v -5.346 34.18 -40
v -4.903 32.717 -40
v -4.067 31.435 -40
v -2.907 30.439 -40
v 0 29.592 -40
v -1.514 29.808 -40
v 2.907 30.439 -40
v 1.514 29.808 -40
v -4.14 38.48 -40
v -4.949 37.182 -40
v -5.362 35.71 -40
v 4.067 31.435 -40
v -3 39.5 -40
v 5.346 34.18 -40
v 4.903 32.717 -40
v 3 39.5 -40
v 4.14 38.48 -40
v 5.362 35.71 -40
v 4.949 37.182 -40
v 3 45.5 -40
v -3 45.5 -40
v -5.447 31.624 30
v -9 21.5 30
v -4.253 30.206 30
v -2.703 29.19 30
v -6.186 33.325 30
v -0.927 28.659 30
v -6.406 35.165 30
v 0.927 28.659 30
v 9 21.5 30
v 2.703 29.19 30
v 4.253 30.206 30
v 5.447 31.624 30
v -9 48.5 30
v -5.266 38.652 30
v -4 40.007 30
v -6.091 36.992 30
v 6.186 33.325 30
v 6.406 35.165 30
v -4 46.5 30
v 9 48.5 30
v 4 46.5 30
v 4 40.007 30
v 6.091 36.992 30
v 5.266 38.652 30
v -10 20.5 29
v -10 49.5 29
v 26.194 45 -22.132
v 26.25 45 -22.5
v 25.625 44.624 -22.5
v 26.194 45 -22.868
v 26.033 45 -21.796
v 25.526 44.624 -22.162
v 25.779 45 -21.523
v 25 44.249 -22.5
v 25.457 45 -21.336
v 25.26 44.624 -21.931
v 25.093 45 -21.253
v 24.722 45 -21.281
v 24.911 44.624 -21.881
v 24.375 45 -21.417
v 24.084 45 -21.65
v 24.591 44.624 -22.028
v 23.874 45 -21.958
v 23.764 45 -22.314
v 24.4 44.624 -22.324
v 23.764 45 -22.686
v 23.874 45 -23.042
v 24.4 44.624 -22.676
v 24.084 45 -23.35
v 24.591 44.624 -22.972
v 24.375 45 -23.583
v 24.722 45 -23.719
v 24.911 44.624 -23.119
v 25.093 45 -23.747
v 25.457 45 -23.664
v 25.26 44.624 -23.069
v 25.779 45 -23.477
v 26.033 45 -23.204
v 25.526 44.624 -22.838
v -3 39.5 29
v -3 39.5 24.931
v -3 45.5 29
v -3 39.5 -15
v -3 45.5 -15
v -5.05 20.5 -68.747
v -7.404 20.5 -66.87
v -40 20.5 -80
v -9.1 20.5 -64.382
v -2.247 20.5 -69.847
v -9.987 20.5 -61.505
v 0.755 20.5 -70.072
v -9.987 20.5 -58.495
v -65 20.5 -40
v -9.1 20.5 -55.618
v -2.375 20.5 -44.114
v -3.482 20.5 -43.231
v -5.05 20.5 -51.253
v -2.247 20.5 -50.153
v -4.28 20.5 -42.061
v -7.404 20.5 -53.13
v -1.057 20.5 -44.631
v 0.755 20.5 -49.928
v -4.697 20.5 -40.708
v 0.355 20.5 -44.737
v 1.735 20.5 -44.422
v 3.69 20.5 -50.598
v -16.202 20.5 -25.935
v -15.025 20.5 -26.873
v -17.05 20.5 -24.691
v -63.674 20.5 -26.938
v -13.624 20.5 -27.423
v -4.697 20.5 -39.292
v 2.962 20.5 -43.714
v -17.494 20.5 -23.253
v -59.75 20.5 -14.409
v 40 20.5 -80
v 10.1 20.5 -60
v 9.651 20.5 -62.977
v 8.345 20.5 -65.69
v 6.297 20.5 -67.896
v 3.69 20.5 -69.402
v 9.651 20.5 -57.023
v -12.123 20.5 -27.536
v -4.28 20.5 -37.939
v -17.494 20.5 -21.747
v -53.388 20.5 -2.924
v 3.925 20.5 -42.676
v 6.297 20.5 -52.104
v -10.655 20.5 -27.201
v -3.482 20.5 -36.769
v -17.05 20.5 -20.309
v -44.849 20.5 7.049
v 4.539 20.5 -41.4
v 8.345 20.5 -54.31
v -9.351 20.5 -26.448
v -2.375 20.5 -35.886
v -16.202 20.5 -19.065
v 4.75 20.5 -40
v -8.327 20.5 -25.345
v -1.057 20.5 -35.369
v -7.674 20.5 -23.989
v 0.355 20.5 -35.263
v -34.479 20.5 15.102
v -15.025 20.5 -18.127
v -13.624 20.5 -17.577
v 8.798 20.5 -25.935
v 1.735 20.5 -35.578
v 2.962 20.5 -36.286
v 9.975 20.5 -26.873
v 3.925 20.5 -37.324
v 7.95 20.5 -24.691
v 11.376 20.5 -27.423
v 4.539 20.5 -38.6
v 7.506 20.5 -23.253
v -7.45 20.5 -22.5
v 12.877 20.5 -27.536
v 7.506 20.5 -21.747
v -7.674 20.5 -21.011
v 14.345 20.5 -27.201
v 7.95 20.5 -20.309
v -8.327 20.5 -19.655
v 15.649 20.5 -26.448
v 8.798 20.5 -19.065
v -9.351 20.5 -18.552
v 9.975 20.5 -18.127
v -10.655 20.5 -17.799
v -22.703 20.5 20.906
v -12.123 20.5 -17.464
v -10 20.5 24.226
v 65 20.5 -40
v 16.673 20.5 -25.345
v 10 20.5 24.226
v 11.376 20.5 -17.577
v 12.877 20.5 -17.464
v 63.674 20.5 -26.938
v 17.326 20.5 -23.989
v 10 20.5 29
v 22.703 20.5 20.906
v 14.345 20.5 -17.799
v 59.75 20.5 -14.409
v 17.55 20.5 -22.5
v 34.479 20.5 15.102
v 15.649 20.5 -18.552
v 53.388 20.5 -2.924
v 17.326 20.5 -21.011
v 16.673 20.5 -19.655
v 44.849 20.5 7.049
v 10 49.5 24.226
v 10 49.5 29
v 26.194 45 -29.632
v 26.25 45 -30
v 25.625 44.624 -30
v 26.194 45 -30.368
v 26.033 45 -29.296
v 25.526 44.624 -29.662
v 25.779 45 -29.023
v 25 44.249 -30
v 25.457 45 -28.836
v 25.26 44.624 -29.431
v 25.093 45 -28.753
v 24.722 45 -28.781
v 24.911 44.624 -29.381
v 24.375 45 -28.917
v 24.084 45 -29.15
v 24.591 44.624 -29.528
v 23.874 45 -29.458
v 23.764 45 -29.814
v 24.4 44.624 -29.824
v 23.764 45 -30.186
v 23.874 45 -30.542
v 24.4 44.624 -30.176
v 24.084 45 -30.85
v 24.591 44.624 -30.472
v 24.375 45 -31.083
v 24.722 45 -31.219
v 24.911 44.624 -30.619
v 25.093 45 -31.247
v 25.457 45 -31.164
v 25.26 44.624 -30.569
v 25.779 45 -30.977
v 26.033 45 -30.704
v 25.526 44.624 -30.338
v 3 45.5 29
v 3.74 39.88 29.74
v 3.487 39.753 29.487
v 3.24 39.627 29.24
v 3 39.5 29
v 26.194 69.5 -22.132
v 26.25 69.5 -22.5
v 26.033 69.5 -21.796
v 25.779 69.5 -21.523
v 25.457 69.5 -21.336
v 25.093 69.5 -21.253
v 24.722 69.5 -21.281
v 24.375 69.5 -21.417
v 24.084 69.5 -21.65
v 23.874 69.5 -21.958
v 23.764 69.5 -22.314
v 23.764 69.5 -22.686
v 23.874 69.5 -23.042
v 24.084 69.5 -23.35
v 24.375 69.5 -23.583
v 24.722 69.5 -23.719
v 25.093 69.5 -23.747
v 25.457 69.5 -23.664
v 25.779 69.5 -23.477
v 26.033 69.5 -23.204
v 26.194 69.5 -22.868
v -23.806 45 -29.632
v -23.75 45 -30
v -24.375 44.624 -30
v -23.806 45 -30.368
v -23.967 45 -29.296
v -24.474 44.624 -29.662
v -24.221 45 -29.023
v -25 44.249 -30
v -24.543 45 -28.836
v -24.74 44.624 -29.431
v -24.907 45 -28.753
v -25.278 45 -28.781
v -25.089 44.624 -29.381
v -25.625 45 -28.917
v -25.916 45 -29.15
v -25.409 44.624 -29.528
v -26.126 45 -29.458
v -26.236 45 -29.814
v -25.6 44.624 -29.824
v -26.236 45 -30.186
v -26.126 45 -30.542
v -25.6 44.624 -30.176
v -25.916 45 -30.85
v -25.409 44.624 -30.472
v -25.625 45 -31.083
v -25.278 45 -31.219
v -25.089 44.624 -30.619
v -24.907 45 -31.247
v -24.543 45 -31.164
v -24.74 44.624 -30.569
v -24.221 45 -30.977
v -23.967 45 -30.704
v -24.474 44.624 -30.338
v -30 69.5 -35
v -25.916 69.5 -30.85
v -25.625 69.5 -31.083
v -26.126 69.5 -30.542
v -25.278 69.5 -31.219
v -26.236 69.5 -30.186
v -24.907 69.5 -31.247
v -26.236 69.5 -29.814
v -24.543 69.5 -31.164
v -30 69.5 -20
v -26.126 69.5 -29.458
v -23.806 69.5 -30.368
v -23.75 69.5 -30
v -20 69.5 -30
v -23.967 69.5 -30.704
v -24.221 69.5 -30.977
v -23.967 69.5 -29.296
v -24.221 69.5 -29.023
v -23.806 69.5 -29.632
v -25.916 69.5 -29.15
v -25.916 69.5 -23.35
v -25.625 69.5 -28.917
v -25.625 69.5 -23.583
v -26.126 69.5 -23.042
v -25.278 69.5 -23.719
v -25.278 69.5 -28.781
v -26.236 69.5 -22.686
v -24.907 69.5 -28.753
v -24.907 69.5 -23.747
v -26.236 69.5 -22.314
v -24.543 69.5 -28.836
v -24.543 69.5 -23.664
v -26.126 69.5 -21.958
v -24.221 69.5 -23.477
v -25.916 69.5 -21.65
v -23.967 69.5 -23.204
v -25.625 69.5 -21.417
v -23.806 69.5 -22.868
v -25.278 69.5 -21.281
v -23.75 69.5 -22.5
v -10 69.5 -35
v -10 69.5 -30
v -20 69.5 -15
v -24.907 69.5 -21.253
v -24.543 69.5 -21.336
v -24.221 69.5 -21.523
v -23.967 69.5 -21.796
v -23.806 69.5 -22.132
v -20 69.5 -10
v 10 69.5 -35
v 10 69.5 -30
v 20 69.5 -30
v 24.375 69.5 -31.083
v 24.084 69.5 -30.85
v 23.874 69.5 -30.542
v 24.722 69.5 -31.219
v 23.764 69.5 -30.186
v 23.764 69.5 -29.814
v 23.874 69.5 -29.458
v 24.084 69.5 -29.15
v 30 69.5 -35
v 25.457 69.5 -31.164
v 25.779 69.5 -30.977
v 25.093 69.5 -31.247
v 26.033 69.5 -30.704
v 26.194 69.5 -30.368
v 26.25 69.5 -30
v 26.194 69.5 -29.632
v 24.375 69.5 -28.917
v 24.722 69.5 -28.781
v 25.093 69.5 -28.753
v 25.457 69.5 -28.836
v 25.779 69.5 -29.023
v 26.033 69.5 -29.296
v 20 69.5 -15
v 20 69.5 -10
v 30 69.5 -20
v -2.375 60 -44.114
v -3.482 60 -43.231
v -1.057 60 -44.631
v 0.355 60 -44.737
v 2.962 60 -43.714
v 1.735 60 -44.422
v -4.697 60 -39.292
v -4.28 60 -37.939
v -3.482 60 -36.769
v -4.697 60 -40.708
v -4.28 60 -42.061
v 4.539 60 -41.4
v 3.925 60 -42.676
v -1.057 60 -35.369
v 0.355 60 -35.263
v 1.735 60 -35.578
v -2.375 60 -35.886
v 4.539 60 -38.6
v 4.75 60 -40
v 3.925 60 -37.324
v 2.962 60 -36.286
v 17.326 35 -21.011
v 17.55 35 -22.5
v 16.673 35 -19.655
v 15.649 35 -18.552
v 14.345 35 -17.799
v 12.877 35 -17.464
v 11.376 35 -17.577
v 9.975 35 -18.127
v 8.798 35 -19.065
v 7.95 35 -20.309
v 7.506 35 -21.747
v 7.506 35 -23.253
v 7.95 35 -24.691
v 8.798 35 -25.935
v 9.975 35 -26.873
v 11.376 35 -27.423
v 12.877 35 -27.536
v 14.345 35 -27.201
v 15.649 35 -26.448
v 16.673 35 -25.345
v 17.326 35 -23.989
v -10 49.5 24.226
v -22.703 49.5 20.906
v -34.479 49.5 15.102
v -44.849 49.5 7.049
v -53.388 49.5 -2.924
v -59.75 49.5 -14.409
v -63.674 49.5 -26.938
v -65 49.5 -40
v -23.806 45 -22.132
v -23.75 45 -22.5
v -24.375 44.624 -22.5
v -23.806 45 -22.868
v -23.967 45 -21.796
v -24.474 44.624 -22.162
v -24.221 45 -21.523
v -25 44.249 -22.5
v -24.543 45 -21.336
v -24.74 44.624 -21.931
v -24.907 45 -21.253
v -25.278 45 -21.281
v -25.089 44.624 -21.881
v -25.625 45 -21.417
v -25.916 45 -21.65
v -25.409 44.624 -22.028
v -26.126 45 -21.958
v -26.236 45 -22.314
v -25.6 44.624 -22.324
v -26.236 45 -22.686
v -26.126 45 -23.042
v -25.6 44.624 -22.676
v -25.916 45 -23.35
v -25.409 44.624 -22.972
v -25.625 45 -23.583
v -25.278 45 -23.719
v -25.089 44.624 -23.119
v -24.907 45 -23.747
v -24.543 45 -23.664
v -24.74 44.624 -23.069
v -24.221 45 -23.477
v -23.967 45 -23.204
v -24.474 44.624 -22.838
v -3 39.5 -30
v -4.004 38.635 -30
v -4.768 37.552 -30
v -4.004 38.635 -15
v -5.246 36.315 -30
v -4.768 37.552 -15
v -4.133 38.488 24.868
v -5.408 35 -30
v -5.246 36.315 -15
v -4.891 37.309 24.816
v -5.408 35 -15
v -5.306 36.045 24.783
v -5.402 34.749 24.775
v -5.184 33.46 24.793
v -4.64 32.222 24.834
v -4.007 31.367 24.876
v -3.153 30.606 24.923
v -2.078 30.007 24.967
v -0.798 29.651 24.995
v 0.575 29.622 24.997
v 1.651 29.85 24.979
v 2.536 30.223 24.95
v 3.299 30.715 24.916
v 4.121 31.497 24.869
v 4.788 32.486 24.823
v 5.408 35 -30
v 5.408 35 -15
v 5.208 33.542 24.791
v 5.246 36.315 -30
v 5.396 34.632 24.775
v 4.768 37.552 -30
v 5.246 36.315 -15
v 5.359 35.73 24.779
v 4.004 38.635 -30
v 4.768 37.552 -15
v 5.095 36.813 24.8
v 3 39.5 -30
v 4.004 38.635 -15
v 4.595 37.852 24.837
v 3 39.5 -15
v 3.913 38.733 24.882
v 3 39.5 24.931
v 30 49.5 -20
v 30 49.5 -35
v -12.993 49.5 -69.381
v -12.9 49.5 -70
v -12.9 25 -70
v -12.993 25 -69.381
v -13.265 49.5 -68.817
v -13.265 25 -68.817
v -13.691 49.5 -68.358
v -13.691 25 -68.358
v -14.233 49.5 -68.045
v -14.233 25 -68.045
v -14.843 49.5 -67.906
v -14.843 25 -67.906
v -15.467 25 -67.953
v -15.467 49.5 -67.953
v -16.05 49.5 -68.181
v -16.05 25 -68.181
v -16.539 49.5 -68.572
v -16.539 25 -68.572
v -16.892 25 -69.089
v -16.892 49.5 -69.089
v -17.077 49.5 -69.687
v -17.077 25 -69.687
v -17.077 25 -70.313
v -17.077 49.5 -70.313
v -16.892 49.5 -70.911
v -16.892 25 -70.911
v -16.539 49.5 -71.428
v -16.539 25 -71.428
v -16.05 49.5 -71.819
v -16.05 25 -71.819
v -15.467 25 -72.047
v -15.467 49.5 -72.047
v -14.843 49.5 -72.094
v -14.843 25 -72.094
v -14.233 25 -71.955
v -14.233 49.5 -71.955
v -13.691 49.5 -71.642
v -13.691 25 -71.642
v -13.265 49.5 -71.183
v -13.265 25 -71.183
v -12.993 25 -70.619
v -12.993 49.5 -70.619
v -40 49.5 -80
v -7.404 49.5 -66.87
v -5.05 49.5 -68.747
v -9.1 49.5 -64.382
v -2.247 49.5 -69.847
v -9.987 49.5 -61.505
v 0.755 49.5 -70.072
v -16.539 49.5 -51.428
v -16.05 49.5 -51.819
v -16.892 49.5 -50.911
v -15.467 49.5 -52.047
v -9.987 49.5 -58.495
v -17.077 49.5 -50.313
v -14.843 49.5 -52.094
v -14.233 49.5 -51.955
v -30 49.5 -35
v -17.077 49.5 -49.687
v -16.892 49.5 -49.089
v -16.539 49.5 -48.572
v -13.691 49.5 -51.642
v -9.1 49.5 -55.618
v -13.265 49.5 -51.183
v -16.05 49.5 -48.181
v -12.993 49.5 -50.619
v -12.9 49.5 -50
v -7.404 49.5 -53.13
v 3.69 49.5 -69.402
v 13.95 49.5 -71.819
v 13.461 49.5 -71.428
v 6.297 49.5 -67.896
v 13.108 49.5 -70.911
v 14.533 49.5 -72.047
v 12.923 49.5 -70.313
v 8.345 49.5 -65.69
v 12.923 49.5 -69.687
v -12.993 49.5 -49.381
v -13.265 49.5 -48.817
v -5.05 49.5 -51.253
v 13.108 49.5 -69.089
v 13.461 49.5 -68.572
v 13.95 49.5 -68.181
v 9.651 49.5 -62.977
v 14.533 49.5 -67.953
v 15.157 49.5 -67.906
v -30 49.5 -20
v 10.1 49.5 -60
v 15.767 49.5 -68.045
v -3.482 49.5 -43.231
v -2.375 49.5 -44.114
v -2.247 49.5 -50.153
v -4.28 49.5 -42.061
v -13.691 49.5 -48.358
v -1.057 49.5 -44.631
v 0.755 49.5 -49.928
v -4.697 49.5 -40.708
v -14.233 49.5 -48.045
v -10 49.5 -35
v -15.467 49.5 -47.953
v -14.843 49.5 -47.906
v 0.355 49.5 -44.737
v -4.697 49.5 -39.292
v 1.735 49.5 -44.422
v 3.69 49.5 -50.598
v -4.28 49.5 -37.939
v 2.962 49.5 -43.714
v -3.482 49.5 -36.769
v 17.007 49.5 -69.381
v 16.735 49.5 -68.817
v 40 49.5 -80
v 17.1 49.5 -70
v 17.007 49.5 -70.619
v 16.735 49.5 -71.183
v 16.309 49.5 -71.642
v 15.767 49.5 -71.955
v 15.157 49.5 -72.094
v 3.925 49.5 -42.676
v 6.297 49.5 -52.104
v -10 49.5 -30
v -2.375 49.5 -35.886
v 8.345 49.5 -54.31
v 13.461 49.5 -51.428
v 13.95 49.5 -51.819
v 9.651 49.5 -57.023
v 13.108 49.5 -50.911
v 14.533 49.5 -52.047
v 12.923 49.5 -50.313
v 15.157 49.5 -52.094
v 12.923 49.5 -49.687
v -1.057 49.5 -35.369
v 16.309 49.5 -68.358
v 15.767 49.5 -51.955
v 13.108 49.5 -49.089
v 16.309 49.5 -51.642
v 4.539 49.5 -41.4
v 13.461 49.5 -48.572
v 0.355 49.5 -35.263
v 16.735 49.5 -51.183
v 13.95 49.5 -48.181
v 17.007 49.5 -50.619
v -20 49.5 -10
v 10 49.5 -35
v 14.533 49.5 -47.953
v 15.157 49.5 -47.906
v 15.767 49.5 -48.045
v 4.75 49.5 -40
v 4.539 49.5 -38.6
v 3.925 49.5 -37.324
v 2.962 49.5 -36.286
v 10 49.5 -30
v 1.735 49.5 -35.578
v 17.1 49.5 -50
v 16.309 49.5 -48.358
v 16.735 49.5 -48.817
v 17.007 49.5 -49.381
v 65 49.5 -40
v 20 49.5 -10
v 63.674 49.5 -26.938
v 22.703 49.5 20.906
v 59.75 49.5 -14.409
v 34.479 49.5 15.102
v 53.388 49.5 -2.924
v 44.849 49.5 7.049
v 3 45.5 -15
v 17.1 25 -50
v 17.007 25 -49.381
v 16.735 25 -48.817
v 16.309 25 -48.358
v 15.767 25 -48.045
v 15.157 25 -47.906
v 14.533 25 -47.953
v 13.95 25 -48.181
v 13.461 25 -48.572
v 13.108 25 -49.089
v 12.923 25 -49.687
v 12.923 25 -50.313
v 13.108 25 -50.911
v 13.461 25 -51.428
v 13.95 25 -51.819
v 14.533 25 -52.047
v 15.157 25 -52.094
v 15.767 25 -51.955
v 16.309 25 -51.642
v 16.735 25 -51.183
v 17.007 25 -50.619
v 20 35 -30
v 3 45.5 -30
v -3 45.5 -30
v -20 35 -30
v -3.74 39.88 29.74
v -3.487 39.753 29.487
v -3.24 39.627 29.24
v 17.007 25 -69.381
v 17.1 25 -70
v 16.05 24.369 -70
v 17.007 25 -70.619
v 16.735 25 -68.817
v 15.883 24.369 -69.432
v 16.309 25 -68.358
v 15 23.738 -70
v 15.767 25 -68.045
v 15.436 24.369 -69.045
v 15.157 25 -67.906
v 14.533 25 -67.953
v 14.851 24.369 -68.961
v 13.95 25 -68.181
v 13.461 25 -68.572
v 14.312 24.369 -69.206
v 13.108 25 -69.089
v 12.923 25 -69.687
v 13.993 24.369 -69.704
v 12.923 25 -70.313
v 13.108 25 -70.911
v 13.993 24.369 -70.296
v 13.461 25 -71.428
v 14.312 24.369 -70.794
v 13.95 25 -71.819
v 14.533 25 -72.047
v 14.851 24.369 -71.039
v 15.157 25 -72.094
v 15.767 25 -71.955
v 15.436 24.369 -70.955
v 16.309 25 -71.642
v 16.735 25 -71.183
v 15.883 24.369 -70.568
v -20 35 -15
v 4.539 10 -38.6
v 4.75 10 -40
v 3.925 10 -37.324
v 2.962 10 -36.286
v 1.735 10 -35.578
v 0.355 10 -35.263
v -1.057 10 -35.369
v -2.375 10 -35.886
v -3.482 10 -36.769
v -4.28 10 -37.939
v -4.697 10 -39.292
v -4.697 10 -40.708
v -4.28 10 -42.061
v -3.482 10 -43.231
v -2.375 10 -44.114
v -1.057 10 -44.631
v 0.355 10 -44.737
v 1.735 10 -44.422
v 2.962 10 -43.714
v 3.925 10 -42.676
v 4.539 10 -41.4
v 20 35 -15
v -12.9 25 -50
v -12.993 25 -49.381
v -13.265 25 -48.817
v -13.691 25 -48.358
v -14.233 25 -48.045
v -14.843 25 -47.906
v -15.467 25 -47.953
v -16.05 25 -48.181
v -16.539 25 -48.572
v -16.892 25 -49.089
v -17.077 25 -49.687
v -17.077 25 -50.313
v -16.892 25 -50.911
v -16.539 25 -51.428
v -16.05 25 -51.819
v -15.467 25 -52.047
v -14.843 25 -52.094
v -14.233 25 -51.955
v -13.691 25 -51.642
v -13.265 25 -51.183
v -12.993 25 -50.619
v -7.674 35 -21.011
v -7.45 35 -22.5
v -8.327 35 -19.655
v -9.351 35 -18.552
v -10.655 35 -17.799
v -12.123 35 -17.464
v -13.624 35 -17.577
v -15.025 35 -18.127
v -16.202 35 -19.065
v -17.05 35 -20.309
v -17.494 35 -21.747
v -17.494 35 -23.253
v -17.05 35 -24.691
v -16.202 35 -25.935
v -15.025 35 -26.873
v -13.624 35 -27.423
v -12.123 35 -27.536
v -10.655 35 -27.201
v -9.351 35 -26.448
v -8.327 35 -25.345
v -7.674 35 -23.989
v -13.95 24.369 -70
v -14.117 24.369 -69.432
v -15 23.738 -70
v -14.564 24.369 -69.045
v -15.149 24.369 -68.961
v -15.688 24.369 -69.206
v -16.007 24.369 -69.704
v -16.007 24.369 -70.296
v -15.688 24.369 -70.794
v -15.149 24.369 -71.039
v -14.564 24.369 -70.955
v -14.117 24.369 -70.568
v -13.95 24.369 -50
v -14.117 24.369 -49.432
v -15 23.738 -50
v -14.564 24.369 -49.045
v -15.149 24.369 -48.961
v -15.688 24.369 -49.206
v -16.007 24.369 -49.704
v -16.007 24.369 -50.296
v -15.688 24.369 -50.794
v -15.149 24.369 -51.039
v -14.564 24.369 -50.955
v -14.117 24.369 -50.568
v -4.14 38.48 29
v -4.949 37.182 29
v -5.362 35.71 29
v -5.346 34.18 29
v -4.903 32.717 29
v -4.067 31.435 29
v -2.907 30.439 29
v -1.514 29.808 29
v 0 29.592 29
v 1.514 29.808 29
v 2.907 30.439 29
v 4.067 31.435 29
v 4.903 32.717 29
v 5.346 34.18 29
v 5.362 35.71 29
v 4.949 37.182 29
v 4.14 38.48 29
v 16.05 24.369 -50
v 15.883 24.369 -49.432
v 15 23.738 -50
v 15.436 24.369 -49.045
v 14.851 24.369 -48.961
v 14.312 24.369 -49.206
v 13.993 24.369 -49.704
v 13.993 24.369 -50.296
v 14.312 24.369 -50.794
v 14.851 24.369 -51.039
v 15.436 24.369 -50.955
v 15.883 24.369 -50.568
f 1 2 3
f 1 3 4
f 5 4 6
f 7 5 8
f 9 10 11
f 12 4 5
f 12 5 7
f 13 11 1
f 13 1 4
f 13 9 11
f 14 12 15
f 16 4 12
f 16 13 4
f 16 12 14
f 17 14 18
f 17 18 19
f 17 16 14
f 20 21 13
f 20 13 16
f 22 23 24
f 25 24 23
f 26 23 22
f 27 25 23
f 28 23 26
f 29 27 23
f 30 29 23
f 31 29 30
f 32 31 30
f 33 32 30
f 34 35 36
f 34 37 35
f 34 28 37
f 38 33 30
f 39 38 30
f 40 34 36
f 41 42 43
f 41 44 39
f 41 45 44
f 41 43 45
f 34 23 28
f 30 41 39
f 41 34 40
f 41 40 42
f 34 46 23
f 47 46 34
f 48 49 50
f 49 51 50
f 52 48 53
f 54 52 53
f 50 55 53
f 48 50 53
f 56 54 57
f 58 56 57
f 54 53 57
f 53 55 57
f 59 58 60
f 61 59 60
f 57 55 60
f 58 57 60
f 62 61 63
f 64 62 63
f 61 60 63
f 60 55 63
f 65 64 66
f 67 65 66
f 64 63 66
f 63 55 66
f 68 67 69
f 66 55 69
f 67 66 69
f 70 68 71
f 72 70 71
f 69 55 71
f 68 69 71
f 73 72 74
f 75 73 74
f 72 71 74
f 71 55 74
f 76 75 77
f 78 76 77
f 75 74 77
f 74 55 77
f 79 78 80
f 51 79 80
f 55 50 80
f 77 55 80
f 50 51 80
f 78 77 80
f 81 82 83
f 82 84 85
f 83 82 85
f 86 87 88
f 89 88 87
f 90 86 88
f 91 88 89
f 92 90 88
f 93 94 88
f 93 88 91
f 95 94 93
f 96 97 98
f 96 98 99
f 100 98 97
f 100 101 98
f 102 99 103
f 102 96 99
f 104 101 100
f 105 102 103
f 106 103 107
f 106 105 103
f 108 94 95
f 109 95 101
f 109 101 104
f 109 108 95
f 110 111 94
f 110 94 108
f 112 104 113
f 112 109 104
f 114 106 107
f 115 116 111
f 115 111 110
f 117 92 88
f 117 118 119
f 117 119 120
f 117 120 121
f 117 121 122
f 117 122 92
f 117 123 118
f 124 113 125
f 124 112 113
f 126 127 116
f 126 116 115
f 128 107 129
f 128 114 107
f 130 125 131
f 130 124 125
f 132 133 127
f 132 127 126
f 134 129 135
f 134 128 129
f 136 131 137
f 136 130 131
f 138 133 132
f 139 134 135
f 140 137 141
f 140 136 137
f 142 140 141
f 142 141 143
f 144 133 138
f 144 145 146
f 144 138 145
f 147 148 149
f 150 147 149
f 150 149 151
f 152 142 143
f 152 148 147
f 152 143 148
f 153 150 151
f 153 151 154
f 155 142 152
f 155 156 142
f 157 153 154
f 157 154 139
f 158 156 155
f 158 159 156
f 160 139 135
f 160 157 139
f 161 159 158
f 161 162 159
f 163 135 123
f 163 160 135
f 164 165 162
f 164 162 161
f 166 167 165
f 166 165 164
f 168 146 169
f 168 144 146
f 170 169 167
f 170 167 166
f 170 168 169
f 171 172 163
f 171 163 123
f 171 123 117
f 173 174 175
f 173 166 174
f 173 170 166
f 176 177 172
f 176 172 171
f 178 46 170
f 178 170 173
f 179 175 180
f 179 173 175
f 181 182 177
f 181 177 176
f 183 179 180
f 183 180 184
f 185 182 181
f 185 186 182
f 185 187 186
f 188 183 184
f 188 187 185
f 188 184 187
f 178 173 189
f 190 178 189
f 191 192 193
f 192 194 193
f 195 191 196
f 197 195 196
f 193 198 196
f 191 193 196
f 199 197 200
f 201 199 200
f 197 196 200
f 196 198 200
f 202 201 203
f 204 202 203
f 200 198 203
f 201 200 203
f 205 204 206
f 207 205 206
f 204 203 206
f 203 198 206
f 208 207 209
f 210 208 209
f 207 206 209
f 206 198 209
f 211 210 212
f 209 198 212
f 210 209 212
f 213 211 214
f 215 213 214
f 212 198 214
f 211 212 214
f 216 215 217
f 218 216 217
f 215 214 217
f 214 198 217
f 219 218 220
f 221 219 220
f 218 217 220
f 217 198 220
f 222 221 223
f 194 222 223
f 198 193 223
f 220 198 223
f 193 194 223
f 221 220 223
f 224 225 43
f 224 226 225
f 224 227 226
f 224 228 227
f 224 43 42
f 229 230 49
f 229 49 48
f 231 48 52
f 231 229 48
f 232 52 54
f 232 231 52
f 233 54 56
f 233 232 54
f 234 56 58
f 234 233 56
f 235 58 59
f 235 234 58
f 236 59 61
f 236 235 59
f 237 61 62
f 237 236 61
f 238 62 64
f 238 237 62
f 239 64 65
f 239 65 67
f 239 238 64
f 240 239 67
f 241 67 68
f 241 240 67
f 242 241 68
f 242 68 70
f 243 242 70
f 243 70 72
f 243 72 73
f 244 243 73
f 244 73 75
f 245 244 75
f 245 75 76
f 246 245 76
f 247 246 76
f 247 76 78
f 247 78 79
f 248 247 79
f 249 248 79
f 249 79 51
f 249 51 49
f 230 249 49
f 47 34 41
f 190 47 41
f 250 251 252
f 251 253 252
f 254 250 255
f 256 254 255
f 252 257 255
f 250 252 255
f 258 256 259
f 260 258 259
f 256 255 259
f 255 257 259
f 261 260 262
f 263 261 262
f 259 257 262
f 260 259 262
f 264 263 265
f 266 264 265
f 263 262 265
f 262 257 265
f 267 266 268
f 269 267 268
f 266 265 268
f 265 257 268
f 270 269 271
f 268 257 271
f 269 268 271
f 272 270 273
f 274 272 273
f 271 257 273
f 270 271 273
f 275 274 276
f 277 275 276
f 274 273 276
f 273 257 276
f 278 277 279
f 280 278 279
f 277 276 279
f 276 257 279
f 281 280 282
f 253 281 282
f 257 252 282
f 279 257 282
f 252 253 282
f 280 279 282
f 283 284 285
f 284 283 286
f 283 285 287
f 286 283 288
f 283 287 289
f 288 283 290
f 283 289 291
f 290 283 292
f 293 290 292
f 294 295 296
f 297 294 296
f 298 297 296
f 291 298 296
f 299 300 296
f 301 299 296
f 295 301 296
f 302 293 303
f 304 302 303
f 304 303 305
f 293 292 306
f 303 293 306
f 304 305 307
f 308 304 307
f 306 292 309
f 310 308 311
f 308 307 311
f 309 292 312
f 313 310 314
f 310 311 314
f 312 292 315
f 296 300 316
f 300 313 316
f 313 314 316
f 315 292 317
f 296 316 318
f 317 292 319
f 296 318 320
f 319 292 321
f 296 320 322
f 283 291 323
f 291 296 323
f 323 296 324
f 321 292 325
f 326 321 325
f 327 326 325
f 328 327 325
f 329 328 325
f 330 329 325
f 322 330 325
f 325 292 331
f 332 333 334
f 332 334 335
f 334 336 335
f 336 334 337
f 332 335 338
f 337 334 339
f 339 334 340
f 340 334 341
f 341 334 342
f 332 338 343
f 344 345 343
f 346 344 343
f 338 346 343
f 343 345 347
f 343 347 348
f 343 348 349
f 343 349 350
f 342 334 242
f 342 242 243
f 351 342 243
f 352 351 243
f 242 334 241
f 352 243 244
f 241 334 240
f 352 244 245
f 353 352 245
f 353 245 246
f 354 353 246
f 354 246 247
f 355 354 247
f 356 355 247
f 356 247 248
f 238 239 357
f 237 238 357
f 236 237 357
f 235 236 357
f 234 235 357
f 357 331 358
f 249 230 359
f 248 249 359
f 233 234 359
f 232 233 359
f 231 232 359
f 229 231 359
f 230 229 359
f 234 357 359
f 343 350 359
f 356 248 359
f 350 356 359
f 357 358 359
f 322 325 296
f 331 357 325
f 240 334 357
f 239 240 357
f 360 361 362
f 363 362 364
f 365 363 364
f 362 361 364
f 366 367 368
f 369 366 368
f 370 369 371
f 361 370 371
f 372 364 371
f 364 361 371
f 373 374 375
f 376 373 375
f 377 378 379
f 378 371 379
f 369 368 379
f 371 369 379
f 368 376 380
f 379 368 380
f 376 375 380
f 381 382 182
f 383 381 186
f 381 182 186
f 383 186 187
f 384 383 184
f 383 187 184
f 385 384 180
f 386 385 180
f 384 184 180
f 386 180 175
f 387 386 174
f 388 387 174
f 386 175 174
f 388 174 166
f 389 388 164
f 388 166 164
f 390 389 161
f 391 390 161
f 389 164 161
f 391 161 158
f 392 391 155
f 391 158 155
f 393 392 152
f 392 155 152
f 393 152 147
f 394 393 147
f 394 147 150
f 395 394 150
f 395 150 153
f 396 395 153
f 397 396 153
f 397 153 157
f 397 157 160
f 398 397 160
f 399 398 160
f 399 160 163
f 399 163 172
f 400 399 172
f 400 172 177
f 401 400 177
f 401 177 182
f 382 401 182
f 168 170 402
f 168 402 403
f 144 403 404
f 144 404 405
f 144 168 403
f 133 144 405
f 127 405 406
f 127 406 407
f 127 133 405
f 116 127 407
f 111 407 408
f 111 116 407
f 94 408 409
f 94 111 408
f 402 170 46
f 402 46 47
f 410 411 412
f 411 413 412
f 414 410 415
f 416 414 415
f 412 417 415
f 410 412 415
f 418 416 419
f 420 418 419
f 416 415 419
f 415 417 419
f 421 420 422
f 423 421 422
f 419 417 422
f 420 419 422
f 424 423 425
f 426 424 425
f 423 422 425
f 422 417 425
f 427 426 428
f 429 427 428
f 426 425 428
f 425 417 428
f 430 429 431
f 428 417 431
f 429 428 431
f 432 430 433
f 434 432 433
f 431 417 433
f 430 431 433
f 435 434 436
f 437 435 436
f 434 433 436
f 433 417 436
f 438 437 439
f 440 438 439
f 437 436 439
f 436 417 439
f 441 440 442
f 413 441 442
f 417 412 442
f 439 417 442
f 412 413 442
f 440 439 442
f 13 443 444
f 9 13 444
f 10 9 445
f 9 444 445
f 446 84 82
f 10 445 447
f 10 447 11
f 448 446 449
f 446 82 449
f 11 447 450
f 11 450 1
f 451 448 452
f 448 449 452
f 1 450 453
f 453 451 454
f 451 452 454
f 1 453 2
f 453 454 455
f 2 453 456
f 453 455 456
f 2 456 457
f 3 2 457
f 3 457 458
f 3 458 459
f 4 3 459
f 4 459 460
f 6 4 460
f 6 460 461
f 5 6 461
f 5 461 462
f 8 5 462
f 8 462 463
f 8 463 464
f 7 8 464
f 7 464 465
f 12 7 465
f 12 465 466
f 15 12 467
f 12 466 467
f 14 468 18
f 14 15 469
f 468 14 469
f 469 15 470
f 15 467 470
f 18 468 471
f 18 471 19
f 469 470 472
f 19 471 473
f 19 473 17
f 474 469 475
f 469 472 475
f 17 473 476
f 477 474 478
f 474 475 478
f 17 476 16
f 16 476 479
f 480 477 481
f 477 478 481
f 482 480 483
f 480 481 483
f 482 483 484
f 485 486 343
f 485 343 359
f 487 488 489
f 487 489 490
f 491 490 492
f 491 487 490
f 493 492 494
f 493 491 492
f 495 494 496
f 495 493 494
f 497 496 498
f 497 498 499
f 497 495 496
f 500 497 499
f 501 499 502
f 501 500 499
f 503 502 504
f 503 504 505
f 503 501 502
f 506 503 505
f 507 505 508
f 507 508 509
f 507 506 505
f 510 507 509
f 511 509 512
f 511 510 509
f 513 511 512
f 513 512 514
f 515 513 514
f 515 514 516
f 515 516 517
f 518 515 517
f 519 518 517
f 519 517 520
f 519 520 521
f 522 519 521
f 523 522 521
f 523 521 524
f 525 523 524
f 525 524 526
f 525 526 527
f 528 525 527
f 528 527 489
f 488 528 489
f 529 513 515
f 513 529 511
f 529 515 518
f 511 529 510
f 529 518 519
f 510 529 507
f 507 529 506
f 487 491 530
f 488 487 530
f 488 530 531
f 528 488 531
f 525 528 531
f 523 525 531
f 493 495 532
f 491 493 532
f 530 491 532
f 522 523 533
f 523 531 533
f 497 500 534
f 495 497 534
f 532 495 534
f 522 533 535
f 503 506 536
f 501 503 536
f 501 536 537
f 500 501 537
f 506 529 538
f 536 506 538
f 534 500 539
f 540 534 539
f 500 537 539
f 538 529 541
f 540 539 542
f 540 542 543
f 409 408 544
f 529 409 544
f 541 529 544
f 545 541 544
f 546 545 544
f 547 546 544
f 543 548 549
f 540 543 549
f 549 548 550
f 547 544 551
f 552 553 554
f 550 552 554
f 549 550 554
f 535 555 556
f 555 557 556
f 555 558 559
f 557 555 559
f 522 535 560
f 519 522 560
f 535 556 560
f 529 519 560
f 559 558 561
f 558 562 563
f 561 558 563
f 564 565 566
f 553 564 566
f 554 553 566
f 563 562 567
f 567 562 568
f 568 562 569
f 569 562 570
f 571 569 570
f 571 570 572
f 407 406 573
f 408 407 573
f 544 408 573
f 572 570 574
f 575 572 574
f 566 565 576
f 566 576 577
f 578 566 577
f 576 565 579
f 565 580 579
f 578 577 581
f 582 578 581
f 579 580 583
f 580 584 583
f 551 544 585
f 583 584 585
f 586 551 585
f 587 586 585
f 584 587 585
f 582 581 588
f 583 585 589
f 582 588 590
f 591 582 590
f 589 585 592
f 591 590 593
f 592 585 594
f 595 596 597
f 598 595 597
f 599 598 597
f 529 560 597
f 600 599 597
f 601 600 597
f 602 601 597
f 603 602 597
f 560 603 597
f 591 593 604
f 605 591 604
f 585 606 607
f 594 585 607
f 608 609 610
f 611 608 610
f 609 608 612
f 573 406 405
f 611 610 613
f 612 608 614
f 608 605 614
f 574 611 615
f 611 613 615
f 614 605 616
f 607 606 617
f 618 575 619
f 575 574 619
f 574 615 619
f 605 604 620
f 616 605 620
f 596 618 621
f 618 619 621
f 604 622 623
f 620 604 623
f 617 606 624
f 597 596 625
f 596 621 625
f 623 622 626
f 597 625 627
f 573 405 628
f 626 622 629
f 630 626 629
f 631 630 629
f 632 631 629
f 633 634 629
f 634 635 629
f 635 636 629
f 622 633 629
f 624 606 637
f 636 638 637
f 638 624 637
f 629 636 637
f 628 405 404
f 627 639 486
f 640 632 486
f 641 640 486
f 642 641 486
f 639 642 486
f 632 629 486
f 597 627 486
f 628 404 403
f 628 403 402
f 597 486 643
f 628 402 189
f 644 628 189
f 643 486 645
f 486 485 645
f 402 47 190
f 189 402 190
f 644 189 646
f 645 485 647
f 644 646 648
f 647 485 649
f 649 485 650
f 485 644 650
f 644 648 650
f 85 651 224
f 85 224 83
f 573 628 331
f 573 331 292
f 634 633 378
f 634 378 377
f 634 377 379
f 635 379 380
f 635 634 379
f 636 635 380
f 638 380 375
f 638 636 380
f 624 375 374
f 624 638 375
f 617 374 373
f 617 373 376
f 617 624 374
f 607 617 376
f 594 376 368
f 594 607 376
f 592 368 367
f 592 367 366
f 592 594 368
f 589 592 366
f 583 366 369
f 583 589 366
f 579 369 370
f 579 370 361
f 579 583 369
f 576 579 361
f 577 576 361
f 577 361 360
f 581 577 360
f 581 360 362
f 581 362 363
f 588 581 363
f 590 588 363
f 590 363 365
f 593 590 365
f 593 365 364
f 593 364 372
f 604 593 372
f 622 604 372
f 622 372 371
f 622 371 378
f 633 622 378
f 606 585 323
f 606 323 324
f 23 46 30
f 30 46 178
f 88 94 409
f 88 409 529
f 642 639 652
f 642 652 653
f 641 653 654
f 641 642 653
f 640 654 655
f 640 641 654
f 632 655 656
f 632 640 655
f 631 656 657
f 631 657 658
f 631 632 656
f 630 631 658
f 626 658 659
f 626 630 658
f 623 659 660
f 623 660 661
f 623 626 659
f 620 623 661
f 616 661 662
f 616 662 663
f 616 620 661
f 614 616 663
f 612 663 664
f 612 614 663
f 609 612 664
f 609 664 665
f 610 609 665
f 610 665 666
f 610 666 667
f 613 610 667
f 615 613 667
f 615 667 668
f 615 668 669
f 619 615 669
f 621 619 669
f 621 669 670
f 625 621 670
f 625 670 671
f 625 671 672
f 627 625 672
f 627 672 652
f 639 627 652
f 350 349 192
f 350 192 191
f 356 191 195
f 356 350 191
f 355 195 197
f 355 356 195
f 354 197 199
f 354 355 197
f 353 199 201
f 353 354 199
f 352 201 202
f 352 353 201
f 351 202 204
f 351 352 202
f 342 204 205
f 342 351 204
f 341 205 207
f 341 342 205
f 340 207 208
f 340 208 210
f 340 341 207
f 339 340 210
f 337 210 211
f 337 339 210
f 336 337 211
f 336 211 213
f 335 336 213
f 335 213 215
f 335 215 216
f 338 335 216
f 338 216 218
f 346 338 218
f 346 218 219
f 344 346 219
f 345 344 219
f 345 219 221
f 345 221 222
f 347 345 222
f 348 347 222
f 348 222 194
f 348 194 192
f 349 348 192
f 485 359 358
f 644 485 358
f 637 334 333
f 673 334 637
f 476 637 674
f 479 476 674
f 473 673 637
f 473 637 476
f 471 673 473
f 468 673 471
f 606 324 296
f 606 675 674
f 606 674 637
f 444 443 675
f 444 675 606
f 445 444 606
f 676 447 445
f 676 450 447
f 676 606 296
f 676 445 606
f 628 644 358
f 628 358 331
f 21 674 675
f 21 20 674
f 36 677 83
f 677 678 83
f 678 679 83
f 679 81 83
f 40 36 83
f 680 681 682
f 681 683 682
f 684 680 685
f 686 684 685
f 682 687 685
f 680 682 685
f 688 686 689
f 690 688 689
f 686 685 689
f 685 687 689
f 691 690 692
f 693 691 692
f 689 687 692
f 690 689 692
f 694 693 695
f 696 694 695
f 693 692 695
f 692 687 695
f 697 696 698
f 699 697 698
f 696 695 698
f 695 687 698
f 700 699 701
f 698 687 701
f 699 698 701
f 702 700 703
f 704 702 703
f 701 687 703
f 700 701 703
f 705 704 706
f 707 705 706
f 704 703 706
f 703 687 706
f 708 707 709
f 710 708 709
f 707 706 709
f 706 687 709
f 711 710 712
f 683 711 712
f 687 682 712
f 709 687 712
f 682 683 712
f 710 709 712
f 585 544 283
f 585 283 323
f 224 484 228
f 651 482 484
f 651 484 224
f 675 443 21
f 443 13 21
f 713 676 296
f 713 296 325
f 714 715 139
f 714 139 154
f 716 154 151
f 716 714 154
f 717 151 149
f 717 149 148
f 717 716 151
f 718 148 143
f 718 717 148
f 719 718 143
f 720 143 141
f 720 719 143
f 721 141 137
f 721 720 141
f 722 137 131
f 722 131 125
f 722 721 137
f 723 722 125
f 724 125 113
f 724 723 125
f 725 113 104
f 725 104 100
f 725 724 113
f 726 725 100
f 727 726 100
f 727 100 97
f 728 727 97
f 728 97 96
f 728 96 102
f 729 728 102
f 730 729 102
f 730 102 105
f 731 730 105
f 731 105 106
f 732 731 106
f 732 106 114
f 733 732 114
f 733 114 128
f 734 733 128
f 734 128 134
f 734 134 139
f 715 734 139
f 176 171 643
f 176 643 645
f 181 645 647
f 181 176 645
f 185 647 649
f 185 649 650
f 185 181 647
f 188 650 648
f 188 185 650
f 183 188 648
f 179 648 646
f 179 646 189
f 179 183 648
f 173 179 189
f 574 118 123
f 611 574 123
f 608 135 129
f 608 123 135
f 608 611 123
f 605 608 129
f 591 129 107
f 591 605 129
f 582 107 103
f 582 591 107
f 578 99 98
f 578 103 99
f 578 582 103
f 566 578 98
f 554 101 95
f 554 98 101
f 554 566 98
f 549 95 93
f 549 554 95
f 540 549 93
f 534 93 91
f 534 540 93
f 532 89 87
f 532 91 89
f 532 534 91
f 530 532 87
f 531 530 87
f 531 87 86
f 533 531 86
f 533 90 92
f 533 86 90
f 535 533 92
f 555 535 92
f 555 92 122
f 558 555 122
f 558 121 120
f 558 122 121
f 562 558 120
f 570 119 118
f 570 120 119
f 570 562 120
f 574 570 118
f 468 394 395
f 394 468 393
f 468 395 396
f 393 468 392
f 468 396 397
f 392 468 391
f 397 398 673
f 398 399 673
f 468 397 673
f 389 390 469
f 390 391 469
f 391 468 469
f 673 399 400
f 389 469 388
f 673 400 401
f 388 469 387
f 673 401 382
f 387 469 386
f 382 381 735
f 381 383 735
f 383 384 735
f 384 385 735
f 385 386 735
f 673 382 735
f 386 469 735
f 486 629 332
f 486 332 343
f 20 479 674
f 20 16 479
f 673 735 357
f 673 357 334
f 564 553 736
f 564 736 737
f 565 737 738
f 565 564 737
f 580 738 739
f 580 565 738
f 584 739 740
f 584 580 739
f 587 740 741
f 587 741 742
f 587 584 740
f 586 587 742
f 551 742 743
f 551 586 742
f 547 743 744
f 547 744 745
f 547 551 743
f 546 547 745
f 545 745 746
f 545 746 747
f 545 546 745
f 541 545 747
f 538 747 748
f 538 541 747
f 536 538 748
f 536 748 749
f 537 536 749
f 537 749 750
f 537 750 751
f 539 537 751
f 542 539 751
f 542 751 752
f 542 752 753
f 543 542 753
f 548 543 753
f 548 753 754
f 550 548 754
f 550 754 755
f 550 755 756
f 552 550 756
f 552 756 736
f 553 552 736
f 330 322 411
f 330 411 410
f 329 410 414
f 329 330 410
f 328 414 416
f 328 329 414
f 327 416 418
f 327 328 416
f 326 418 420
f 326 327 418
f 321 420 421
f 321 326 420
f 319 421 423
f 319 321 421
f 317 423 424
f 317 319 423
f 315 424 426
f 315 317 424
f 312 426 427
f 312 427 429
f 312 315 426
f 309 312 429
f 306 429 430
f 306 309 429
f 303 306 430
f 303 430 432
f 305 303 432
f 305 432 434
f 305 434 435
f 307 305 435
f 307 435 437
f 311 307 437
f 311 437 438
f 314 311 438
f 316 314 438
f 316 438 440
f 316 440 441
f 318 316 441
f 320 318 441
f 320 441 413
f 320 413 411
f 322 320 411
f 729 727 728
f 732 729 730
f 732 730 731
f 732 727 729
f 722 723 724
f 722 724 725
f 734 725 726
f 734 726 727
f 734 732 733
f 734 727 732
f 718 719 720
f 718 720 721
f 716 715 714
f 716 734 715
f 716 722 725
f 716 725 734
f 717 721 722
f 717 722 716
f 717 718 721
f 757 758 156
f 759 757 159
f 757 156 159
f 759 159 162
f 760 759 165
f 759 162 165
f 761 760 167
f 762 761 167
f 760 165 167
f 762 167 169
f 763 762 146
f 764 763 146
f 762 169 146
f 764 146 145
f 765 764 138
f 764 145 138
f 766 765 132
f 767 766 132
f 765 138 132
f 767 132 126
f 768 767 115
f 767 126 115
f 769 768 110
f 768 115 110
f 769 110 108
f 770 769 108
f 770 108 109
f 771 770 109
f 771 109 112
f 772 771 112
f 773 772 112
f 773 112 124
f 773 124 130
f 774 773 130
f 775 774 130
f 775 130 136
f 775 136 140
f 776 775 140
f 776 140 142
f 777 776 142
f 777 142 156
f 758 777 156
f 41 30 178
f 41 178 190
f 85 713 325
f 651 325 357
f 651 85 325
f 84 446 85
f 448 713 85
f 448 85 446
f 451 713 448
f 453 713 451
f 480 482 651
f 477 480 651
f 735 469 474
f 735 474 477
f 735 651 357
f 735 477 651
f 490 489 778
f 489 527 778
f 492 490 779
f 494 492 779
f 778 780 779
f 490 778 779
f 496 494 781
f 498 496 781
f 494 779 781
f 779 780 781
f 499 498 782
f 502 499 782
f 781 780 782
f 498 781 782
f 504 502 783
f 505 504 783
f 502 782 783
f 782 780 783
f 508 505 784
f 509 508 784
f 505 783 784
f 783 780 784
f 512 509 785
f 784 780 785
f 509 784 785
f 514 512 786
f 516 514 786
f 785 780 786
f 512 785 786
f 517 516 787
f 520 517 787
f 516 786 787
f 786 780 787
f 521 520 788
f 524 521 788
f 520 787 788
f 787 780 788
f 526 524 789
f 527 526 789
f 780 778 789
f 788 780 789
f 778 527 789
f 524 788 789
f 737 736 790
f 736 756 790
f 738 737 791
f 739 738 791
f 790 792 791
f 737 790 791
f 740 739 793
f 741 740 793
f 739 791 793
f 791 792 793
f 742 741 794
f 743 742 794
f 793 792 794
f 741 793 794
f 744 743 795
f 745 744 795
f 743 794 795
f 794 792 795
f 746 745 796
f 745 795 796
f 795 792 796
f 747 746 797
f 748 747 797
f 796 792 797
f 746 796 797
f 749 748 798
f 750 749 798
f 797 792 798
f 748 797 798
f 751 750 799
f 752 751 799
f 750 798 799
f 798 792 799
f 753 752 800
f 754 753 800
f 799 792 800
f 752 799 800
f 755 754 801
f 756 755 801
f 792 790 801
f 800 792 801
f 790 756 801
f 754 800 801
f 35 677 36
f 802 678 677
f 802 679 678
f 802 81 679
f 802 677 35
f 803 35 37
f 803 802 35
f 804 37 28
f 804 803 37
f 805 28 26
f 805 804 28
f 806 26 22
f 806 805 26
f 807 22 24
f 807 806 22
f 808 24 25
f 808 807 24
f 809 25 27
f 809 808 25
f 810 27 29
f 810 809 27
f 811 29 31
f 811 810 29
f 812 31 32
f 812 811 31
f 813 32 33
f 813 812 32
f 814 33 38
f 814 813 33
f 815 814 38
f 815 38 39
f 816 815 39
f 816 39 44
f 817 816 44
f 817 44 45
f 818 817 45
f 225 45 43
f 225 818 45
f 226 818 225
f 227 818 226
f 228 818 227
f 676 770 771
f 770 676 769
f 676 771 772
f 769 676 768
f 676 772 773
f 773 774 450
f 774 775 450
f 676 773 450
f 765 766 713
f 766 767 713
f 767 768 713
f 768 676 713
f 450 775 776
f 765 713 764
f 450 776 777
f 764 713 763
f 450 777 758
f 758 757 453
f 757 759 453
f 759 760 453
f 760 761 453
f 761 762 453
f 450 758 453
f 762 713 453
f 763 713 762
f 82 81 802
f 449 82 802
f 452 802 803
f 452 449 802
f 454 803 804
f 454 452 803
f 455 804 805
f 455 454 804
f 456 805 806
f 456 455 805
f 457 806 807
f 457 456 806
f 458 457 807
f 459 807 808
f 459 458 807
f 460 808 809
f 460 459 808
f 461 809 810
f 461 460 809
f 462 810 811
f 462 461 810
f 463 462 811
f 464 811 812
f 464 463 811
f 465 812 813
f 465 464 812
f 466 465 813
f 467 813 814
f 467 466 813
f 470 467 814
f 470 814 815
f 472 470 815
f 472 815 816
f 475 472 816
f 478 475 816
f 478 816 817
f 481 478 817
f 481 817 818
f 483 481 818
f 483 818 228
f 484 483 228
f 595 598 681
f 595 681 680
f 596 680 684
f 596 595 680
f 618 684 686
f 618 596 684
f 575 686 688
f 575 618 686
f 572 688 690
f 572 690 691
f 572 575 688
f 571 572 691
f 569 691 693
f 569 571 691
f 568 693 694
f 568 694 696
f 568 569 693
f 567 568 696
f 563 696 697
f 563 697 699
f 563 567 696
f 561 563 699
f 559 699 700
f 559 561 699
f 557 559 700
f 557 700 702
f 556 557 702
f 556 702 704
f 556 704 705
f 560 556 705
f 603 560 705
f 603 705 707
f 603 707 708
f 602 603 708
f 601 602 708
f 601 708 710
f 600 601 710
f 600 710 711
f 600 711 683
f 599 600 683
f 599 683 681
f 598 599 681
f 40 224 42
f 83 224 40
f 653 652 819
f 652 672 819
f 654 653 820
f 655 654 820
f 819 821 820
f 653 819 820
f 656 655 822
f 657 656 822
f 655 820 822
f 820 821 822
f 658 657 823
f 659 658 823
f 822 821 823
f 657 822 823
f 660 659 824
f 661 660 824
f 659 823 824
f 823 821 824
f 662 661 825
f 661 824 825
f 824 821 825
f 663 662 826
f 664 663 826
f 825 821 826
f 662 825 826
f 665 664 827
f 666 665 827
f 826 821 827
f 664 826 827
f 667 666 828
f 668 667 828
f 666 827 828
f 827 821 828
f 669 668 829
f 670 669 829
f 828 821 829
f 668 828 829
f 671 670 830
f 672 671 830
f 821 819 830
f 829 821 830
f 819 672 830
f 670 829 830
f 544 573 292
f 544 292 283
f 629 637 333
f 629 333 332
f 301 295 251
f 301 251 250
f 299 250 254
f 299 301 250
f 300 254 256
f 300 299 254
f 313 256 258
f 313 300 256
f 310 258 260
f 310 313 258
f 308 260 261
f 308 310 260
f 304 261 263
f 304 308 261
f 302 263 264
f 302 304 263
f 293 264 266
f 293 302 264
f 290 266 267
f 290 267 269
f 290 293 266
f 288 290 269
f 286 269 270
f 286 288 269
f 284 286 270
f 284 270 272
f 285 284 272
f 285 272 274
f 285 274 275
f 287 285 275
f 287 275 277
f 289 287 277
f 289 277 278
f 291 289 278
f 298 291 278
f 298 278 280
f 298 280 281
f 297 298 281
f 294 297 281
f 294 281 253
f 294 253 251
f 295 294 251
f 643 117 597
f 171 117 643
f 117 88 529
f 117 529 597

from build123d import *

# Parameters (mm, degrees)
SKETCH008_W     = 20
SKETCH008_H     = 29
PAD008_DEPTH    = 15
PAD009_DEPTH    = 29
SKETCH017_R     = 4.75
PAD015_DEPTH    = 50
POCKET001_DEPTH = 70
SKETCH018_W     = 40
SKETCH018_H     = 15
POCKET002_DEPTH = 15
SKETCH019_R     = 5.05
POCKET003_DEPTH = 117
PAD016_DEPTH    = 20
SKETCH023_R     = 1.25
HOLE_DEPTH      = 25
HOLE_TIPS_R     = 1.25
SKETCH031_R     = 10.1
POCKET007_DEPTH = 30
SKETCH032_R     = 2.1
HOLE003_DEPTH   = 25
HOLE003_TIPS_R  = 2.1
CHAMFER001_SIZE = 1


with BuildPart() as part:
    # Sketch008 → Pad008 (new body)
    with BuildSketch(Plane.XY.offset(15)):
        with Locations((0, 35)):
            Rectangle(SKETCH008_W, SKETCH008_H)
        with BuildLine():
            ThreePointArc((-3, 39.5), (0, 29.591673), (3, 39.5))
            Line((3, 39.5), (3, 45.5))
            Line((3, 45.5), (-3, 45.5))
            Line((-3, 39.5), (-3, 45.5))
        make_face(mode=Mode.SUBTRACT)
    extrude(amount=PAD008_DEPTH)

    # Sketch009 → Pad009 (join)
    with BuildSketch(Plane.XZ.offset(-20.5)):
        with BuildLine():
            ThreePointArc((64.999803, -40), (0, 24.999803), (-64.999803, -40))
            Line((-64.999803, -40), (-40, -80))
            Line((-40, -80), (40, -80))
            Line((40, -80), (64.999803, -40))
        make_face()
    extrude(amount=-PAD009_DEPTH)

    # Sketch017 → Pad015 (join)
    with BuildSketch(Plane.XZ.offset(-10)):
        with Locations((0, -40)):
            Circle(SKETCH017_R)
    extrude(amount=-PAD015_DEPTH)

    # Sketch016 → Pocket001 (cut)
    with BuildSketch(Plane.XY.offset(30)):
        with BuildLine():
            ThreePointArc((-3, 39.5), (0, 29.591673), (3, 39.5))
            Line((3, 45.5), (3, 39.5))
            Line((-3, 45.5), (3, 45.5))
            Line((-3, 39.5), (-3, 45.5))
        make_face()
    extrude(amount=-POCKET001_DEPTH, mode=Mode.SUBTRACT)

    # Sketch018 → Pocket002 (cut)
    with BuildSketch(Plane.XZ.offset(-50)):
        with Locations((0, -22.5)):
            Rectangle(SKETCH018_W, SKETCH018_H)
    extrude(amount=POCKET002_DEPTH, mode=Mode.SUBTRACT)

    # Sketch019 → Pocket003 (cut)
    with BuildSketch(Plane.XZ):
        with Locations((-12.5, -22.5)):
            Circle(SKETCH019_R)
        with Locations((12.5, -22.5)):
            Circle(SKETCH019_R)
    extrude(amount=-POCKET003_DEPTH, mode=Mode.SUBTRACT)

    # Sketch022 → Pad016 (join)
    with BuildSketch(Plane.XZ.offset(-49.5)):
        Polygon((-10, -35), (-10, -30), (-20, -30), (-20, -15), (20, -15), (20, -30), (10, -30), (10, -35), (30, -35), (30, -20), (20, -10), (-20, -10), (-30, -20), (-30, -35), align=None)
    extrude(amount=-PAD016_DEPTH)

    # Sketch023 → Hole (cut)
    with BuildSketch(Plane.XZ.offset(-70)):
        with Locations((-25, -30)):
            Circle(SKETCH023_R)
        with Locations((25, -30)):
            Circle(SKETCH023_R)
        with Locations((-25, -22.5)):
            Circle(SKETCH023_R)
        with Locations((25, -22.5)):
            Circle(SKETCH023_R)
    extrude(amount=HOLE_DEPTH, mode=Mode.SUBTRACT)

    # Hole tips → Hole tip 1 section 0
    with BuildSketch(Plane.XZ.offset(-45), mode=Mode.PRIVATE) as hole_tip_1_s0:
        with Locations((-25, -30)):
            Circle(HOLE_TIPS_R)
    loft([hole_tip_1_s0.sketch, Vertex(-25, 44.248924, -30)], mode=Mode.SUBTRACT)

    # Hole tips → Hole tip 2 section 0
    with BuildSketch(Plane.XZ.offset(-45), mode=Mode.PRIVATE) as hole_tip_2_s0:
        with Locations((25, -30)):
            Circle(HOLE_TIPS_R)
    loft([hole_tip_2_s0.sketch, Vertex(25, 44.248924, -30)], mode=Mode.SUBTRACT)

    # Hole tips → Hole tip 3 section 0
    with BuildSketch(Plane.XZ.offset(-45), mode=Mode.PRIVATE) as hole_tip_3_s0:
        with Locations((-25, -22.5)):
            Circle(HOLE_TIPS_R)
    loft([hole_tip_3_s0.sketch, Vertex(-25, 44.248924, -22.5)], mode=Mode.SUBTRACT)

    # Hole tips → Hole tip 4 section 0
    with BuildSketch(Plane.XZ.offset(-45), mode=Mode.PRIVATE) as hole_tip_4_s0:
        with Locations((25, -22.5)):
            Circle(HOLE_TIPS_R)
    loft([hole_tip_4_s0.sketch, Vertex(25, 44.248924, -22.5)], mode=Mode.SUBTRACT)

    # Sketch031 → Pocket007 (cut)
    with BuildSketch(Plane.XZ.offset(-50)):
        with Locations((0, -60)):
            Circle(SKETCH031_R)
    extrude(amount=POCKET007_DEPTH, mode=Mode.SUBTRACT)

    # Sketch032 → Hole003 (cut)
    with BuildSketch(Plane.XZ.offset(-50)):
        with Locations((-15, -50)):
            Circle(SKETCH032_R)
        with Locations((-15, -70)):
            Circle(SKETCH032_R)
        with Locations((15, -70)):
            Circle(SKETCH032_R)
        with Locations((15, -50)):
            Circle(SKETCH032_R)
    extrude(amount=HOLE003_DEPTH, mode=Mode.SUBTRACT)

    # Hole003 tips → Hole003 tip 1 section 0
    with BuildSketch(Plane.XZ.offset(-25), mode=Mode.PRIVATE) as hole003_tip_1_s0:
        with Locations((-15, -50)):
            Circle(HOLE003_TIPS_R)
    loft([hole003_tip_1_s0.sketch, Vertex(-15, 23.738193, -50)], mode=Mode.SUBTRACT)

    # Hole003 tips → Hole003 tip 2 section 0
    with BuildSketch(Plane.XZ.offset(-25), mode=Mode.PRIVATE) as hole003_tip_2_s0:
        with Locations((-15, -70)):
            Circle(HOLE003_TIPS_R)
    loft([hole003_tip_2_s0.sketch, Vertex(-15, 23.738193, -70)], mode=Mode.SUBTRACT)

    # Hole003 tips → Hole003 tip 3 section 0
    with BuildSketch(Plane.XZ.offset(-25), mode=Mode.PRIVATE) as hole003_tip_3_s0:
        with Locations((15, -70)):
            Circle(HOLE003_TIPS_R)
    loft([hole003_tip_3_s0.sketch, Vertex(15, 23.738193, -70)], mode=Mode.SUBTRACT)

    # Hole003 tips → Hole003 tip 4 section 0
    with BuildSketch(Plane.XZ.offset(-25), mode=Mode.PRIVATE) as hole003_tip_4_s0:
        with Locations((15, -50)):
            Circle(HOLE003_TIPS_R)
    loft([hole003_tip_4_s0.sketch, Vertex(15, 23.738193, -50)], mode=Mode.SUBTRACT)

    # Chamfer001
    chamfer001_edges = [part.edges().sort_by_distance(p)[0] for p in [
        (3, 42.5, 30),
        (0, 45.5, 30),
        (-3, 42.5, 30),
        (0, 29.591673, 30),
        (-10, 35, 30),
        (0, 49.5, 30),
        (10, 35, 30),
        (0, 20.5, 30),
    ]]
    chamfer(chamfer001_edges, length=CHAMFER001_SIZE)


solid = part.part
